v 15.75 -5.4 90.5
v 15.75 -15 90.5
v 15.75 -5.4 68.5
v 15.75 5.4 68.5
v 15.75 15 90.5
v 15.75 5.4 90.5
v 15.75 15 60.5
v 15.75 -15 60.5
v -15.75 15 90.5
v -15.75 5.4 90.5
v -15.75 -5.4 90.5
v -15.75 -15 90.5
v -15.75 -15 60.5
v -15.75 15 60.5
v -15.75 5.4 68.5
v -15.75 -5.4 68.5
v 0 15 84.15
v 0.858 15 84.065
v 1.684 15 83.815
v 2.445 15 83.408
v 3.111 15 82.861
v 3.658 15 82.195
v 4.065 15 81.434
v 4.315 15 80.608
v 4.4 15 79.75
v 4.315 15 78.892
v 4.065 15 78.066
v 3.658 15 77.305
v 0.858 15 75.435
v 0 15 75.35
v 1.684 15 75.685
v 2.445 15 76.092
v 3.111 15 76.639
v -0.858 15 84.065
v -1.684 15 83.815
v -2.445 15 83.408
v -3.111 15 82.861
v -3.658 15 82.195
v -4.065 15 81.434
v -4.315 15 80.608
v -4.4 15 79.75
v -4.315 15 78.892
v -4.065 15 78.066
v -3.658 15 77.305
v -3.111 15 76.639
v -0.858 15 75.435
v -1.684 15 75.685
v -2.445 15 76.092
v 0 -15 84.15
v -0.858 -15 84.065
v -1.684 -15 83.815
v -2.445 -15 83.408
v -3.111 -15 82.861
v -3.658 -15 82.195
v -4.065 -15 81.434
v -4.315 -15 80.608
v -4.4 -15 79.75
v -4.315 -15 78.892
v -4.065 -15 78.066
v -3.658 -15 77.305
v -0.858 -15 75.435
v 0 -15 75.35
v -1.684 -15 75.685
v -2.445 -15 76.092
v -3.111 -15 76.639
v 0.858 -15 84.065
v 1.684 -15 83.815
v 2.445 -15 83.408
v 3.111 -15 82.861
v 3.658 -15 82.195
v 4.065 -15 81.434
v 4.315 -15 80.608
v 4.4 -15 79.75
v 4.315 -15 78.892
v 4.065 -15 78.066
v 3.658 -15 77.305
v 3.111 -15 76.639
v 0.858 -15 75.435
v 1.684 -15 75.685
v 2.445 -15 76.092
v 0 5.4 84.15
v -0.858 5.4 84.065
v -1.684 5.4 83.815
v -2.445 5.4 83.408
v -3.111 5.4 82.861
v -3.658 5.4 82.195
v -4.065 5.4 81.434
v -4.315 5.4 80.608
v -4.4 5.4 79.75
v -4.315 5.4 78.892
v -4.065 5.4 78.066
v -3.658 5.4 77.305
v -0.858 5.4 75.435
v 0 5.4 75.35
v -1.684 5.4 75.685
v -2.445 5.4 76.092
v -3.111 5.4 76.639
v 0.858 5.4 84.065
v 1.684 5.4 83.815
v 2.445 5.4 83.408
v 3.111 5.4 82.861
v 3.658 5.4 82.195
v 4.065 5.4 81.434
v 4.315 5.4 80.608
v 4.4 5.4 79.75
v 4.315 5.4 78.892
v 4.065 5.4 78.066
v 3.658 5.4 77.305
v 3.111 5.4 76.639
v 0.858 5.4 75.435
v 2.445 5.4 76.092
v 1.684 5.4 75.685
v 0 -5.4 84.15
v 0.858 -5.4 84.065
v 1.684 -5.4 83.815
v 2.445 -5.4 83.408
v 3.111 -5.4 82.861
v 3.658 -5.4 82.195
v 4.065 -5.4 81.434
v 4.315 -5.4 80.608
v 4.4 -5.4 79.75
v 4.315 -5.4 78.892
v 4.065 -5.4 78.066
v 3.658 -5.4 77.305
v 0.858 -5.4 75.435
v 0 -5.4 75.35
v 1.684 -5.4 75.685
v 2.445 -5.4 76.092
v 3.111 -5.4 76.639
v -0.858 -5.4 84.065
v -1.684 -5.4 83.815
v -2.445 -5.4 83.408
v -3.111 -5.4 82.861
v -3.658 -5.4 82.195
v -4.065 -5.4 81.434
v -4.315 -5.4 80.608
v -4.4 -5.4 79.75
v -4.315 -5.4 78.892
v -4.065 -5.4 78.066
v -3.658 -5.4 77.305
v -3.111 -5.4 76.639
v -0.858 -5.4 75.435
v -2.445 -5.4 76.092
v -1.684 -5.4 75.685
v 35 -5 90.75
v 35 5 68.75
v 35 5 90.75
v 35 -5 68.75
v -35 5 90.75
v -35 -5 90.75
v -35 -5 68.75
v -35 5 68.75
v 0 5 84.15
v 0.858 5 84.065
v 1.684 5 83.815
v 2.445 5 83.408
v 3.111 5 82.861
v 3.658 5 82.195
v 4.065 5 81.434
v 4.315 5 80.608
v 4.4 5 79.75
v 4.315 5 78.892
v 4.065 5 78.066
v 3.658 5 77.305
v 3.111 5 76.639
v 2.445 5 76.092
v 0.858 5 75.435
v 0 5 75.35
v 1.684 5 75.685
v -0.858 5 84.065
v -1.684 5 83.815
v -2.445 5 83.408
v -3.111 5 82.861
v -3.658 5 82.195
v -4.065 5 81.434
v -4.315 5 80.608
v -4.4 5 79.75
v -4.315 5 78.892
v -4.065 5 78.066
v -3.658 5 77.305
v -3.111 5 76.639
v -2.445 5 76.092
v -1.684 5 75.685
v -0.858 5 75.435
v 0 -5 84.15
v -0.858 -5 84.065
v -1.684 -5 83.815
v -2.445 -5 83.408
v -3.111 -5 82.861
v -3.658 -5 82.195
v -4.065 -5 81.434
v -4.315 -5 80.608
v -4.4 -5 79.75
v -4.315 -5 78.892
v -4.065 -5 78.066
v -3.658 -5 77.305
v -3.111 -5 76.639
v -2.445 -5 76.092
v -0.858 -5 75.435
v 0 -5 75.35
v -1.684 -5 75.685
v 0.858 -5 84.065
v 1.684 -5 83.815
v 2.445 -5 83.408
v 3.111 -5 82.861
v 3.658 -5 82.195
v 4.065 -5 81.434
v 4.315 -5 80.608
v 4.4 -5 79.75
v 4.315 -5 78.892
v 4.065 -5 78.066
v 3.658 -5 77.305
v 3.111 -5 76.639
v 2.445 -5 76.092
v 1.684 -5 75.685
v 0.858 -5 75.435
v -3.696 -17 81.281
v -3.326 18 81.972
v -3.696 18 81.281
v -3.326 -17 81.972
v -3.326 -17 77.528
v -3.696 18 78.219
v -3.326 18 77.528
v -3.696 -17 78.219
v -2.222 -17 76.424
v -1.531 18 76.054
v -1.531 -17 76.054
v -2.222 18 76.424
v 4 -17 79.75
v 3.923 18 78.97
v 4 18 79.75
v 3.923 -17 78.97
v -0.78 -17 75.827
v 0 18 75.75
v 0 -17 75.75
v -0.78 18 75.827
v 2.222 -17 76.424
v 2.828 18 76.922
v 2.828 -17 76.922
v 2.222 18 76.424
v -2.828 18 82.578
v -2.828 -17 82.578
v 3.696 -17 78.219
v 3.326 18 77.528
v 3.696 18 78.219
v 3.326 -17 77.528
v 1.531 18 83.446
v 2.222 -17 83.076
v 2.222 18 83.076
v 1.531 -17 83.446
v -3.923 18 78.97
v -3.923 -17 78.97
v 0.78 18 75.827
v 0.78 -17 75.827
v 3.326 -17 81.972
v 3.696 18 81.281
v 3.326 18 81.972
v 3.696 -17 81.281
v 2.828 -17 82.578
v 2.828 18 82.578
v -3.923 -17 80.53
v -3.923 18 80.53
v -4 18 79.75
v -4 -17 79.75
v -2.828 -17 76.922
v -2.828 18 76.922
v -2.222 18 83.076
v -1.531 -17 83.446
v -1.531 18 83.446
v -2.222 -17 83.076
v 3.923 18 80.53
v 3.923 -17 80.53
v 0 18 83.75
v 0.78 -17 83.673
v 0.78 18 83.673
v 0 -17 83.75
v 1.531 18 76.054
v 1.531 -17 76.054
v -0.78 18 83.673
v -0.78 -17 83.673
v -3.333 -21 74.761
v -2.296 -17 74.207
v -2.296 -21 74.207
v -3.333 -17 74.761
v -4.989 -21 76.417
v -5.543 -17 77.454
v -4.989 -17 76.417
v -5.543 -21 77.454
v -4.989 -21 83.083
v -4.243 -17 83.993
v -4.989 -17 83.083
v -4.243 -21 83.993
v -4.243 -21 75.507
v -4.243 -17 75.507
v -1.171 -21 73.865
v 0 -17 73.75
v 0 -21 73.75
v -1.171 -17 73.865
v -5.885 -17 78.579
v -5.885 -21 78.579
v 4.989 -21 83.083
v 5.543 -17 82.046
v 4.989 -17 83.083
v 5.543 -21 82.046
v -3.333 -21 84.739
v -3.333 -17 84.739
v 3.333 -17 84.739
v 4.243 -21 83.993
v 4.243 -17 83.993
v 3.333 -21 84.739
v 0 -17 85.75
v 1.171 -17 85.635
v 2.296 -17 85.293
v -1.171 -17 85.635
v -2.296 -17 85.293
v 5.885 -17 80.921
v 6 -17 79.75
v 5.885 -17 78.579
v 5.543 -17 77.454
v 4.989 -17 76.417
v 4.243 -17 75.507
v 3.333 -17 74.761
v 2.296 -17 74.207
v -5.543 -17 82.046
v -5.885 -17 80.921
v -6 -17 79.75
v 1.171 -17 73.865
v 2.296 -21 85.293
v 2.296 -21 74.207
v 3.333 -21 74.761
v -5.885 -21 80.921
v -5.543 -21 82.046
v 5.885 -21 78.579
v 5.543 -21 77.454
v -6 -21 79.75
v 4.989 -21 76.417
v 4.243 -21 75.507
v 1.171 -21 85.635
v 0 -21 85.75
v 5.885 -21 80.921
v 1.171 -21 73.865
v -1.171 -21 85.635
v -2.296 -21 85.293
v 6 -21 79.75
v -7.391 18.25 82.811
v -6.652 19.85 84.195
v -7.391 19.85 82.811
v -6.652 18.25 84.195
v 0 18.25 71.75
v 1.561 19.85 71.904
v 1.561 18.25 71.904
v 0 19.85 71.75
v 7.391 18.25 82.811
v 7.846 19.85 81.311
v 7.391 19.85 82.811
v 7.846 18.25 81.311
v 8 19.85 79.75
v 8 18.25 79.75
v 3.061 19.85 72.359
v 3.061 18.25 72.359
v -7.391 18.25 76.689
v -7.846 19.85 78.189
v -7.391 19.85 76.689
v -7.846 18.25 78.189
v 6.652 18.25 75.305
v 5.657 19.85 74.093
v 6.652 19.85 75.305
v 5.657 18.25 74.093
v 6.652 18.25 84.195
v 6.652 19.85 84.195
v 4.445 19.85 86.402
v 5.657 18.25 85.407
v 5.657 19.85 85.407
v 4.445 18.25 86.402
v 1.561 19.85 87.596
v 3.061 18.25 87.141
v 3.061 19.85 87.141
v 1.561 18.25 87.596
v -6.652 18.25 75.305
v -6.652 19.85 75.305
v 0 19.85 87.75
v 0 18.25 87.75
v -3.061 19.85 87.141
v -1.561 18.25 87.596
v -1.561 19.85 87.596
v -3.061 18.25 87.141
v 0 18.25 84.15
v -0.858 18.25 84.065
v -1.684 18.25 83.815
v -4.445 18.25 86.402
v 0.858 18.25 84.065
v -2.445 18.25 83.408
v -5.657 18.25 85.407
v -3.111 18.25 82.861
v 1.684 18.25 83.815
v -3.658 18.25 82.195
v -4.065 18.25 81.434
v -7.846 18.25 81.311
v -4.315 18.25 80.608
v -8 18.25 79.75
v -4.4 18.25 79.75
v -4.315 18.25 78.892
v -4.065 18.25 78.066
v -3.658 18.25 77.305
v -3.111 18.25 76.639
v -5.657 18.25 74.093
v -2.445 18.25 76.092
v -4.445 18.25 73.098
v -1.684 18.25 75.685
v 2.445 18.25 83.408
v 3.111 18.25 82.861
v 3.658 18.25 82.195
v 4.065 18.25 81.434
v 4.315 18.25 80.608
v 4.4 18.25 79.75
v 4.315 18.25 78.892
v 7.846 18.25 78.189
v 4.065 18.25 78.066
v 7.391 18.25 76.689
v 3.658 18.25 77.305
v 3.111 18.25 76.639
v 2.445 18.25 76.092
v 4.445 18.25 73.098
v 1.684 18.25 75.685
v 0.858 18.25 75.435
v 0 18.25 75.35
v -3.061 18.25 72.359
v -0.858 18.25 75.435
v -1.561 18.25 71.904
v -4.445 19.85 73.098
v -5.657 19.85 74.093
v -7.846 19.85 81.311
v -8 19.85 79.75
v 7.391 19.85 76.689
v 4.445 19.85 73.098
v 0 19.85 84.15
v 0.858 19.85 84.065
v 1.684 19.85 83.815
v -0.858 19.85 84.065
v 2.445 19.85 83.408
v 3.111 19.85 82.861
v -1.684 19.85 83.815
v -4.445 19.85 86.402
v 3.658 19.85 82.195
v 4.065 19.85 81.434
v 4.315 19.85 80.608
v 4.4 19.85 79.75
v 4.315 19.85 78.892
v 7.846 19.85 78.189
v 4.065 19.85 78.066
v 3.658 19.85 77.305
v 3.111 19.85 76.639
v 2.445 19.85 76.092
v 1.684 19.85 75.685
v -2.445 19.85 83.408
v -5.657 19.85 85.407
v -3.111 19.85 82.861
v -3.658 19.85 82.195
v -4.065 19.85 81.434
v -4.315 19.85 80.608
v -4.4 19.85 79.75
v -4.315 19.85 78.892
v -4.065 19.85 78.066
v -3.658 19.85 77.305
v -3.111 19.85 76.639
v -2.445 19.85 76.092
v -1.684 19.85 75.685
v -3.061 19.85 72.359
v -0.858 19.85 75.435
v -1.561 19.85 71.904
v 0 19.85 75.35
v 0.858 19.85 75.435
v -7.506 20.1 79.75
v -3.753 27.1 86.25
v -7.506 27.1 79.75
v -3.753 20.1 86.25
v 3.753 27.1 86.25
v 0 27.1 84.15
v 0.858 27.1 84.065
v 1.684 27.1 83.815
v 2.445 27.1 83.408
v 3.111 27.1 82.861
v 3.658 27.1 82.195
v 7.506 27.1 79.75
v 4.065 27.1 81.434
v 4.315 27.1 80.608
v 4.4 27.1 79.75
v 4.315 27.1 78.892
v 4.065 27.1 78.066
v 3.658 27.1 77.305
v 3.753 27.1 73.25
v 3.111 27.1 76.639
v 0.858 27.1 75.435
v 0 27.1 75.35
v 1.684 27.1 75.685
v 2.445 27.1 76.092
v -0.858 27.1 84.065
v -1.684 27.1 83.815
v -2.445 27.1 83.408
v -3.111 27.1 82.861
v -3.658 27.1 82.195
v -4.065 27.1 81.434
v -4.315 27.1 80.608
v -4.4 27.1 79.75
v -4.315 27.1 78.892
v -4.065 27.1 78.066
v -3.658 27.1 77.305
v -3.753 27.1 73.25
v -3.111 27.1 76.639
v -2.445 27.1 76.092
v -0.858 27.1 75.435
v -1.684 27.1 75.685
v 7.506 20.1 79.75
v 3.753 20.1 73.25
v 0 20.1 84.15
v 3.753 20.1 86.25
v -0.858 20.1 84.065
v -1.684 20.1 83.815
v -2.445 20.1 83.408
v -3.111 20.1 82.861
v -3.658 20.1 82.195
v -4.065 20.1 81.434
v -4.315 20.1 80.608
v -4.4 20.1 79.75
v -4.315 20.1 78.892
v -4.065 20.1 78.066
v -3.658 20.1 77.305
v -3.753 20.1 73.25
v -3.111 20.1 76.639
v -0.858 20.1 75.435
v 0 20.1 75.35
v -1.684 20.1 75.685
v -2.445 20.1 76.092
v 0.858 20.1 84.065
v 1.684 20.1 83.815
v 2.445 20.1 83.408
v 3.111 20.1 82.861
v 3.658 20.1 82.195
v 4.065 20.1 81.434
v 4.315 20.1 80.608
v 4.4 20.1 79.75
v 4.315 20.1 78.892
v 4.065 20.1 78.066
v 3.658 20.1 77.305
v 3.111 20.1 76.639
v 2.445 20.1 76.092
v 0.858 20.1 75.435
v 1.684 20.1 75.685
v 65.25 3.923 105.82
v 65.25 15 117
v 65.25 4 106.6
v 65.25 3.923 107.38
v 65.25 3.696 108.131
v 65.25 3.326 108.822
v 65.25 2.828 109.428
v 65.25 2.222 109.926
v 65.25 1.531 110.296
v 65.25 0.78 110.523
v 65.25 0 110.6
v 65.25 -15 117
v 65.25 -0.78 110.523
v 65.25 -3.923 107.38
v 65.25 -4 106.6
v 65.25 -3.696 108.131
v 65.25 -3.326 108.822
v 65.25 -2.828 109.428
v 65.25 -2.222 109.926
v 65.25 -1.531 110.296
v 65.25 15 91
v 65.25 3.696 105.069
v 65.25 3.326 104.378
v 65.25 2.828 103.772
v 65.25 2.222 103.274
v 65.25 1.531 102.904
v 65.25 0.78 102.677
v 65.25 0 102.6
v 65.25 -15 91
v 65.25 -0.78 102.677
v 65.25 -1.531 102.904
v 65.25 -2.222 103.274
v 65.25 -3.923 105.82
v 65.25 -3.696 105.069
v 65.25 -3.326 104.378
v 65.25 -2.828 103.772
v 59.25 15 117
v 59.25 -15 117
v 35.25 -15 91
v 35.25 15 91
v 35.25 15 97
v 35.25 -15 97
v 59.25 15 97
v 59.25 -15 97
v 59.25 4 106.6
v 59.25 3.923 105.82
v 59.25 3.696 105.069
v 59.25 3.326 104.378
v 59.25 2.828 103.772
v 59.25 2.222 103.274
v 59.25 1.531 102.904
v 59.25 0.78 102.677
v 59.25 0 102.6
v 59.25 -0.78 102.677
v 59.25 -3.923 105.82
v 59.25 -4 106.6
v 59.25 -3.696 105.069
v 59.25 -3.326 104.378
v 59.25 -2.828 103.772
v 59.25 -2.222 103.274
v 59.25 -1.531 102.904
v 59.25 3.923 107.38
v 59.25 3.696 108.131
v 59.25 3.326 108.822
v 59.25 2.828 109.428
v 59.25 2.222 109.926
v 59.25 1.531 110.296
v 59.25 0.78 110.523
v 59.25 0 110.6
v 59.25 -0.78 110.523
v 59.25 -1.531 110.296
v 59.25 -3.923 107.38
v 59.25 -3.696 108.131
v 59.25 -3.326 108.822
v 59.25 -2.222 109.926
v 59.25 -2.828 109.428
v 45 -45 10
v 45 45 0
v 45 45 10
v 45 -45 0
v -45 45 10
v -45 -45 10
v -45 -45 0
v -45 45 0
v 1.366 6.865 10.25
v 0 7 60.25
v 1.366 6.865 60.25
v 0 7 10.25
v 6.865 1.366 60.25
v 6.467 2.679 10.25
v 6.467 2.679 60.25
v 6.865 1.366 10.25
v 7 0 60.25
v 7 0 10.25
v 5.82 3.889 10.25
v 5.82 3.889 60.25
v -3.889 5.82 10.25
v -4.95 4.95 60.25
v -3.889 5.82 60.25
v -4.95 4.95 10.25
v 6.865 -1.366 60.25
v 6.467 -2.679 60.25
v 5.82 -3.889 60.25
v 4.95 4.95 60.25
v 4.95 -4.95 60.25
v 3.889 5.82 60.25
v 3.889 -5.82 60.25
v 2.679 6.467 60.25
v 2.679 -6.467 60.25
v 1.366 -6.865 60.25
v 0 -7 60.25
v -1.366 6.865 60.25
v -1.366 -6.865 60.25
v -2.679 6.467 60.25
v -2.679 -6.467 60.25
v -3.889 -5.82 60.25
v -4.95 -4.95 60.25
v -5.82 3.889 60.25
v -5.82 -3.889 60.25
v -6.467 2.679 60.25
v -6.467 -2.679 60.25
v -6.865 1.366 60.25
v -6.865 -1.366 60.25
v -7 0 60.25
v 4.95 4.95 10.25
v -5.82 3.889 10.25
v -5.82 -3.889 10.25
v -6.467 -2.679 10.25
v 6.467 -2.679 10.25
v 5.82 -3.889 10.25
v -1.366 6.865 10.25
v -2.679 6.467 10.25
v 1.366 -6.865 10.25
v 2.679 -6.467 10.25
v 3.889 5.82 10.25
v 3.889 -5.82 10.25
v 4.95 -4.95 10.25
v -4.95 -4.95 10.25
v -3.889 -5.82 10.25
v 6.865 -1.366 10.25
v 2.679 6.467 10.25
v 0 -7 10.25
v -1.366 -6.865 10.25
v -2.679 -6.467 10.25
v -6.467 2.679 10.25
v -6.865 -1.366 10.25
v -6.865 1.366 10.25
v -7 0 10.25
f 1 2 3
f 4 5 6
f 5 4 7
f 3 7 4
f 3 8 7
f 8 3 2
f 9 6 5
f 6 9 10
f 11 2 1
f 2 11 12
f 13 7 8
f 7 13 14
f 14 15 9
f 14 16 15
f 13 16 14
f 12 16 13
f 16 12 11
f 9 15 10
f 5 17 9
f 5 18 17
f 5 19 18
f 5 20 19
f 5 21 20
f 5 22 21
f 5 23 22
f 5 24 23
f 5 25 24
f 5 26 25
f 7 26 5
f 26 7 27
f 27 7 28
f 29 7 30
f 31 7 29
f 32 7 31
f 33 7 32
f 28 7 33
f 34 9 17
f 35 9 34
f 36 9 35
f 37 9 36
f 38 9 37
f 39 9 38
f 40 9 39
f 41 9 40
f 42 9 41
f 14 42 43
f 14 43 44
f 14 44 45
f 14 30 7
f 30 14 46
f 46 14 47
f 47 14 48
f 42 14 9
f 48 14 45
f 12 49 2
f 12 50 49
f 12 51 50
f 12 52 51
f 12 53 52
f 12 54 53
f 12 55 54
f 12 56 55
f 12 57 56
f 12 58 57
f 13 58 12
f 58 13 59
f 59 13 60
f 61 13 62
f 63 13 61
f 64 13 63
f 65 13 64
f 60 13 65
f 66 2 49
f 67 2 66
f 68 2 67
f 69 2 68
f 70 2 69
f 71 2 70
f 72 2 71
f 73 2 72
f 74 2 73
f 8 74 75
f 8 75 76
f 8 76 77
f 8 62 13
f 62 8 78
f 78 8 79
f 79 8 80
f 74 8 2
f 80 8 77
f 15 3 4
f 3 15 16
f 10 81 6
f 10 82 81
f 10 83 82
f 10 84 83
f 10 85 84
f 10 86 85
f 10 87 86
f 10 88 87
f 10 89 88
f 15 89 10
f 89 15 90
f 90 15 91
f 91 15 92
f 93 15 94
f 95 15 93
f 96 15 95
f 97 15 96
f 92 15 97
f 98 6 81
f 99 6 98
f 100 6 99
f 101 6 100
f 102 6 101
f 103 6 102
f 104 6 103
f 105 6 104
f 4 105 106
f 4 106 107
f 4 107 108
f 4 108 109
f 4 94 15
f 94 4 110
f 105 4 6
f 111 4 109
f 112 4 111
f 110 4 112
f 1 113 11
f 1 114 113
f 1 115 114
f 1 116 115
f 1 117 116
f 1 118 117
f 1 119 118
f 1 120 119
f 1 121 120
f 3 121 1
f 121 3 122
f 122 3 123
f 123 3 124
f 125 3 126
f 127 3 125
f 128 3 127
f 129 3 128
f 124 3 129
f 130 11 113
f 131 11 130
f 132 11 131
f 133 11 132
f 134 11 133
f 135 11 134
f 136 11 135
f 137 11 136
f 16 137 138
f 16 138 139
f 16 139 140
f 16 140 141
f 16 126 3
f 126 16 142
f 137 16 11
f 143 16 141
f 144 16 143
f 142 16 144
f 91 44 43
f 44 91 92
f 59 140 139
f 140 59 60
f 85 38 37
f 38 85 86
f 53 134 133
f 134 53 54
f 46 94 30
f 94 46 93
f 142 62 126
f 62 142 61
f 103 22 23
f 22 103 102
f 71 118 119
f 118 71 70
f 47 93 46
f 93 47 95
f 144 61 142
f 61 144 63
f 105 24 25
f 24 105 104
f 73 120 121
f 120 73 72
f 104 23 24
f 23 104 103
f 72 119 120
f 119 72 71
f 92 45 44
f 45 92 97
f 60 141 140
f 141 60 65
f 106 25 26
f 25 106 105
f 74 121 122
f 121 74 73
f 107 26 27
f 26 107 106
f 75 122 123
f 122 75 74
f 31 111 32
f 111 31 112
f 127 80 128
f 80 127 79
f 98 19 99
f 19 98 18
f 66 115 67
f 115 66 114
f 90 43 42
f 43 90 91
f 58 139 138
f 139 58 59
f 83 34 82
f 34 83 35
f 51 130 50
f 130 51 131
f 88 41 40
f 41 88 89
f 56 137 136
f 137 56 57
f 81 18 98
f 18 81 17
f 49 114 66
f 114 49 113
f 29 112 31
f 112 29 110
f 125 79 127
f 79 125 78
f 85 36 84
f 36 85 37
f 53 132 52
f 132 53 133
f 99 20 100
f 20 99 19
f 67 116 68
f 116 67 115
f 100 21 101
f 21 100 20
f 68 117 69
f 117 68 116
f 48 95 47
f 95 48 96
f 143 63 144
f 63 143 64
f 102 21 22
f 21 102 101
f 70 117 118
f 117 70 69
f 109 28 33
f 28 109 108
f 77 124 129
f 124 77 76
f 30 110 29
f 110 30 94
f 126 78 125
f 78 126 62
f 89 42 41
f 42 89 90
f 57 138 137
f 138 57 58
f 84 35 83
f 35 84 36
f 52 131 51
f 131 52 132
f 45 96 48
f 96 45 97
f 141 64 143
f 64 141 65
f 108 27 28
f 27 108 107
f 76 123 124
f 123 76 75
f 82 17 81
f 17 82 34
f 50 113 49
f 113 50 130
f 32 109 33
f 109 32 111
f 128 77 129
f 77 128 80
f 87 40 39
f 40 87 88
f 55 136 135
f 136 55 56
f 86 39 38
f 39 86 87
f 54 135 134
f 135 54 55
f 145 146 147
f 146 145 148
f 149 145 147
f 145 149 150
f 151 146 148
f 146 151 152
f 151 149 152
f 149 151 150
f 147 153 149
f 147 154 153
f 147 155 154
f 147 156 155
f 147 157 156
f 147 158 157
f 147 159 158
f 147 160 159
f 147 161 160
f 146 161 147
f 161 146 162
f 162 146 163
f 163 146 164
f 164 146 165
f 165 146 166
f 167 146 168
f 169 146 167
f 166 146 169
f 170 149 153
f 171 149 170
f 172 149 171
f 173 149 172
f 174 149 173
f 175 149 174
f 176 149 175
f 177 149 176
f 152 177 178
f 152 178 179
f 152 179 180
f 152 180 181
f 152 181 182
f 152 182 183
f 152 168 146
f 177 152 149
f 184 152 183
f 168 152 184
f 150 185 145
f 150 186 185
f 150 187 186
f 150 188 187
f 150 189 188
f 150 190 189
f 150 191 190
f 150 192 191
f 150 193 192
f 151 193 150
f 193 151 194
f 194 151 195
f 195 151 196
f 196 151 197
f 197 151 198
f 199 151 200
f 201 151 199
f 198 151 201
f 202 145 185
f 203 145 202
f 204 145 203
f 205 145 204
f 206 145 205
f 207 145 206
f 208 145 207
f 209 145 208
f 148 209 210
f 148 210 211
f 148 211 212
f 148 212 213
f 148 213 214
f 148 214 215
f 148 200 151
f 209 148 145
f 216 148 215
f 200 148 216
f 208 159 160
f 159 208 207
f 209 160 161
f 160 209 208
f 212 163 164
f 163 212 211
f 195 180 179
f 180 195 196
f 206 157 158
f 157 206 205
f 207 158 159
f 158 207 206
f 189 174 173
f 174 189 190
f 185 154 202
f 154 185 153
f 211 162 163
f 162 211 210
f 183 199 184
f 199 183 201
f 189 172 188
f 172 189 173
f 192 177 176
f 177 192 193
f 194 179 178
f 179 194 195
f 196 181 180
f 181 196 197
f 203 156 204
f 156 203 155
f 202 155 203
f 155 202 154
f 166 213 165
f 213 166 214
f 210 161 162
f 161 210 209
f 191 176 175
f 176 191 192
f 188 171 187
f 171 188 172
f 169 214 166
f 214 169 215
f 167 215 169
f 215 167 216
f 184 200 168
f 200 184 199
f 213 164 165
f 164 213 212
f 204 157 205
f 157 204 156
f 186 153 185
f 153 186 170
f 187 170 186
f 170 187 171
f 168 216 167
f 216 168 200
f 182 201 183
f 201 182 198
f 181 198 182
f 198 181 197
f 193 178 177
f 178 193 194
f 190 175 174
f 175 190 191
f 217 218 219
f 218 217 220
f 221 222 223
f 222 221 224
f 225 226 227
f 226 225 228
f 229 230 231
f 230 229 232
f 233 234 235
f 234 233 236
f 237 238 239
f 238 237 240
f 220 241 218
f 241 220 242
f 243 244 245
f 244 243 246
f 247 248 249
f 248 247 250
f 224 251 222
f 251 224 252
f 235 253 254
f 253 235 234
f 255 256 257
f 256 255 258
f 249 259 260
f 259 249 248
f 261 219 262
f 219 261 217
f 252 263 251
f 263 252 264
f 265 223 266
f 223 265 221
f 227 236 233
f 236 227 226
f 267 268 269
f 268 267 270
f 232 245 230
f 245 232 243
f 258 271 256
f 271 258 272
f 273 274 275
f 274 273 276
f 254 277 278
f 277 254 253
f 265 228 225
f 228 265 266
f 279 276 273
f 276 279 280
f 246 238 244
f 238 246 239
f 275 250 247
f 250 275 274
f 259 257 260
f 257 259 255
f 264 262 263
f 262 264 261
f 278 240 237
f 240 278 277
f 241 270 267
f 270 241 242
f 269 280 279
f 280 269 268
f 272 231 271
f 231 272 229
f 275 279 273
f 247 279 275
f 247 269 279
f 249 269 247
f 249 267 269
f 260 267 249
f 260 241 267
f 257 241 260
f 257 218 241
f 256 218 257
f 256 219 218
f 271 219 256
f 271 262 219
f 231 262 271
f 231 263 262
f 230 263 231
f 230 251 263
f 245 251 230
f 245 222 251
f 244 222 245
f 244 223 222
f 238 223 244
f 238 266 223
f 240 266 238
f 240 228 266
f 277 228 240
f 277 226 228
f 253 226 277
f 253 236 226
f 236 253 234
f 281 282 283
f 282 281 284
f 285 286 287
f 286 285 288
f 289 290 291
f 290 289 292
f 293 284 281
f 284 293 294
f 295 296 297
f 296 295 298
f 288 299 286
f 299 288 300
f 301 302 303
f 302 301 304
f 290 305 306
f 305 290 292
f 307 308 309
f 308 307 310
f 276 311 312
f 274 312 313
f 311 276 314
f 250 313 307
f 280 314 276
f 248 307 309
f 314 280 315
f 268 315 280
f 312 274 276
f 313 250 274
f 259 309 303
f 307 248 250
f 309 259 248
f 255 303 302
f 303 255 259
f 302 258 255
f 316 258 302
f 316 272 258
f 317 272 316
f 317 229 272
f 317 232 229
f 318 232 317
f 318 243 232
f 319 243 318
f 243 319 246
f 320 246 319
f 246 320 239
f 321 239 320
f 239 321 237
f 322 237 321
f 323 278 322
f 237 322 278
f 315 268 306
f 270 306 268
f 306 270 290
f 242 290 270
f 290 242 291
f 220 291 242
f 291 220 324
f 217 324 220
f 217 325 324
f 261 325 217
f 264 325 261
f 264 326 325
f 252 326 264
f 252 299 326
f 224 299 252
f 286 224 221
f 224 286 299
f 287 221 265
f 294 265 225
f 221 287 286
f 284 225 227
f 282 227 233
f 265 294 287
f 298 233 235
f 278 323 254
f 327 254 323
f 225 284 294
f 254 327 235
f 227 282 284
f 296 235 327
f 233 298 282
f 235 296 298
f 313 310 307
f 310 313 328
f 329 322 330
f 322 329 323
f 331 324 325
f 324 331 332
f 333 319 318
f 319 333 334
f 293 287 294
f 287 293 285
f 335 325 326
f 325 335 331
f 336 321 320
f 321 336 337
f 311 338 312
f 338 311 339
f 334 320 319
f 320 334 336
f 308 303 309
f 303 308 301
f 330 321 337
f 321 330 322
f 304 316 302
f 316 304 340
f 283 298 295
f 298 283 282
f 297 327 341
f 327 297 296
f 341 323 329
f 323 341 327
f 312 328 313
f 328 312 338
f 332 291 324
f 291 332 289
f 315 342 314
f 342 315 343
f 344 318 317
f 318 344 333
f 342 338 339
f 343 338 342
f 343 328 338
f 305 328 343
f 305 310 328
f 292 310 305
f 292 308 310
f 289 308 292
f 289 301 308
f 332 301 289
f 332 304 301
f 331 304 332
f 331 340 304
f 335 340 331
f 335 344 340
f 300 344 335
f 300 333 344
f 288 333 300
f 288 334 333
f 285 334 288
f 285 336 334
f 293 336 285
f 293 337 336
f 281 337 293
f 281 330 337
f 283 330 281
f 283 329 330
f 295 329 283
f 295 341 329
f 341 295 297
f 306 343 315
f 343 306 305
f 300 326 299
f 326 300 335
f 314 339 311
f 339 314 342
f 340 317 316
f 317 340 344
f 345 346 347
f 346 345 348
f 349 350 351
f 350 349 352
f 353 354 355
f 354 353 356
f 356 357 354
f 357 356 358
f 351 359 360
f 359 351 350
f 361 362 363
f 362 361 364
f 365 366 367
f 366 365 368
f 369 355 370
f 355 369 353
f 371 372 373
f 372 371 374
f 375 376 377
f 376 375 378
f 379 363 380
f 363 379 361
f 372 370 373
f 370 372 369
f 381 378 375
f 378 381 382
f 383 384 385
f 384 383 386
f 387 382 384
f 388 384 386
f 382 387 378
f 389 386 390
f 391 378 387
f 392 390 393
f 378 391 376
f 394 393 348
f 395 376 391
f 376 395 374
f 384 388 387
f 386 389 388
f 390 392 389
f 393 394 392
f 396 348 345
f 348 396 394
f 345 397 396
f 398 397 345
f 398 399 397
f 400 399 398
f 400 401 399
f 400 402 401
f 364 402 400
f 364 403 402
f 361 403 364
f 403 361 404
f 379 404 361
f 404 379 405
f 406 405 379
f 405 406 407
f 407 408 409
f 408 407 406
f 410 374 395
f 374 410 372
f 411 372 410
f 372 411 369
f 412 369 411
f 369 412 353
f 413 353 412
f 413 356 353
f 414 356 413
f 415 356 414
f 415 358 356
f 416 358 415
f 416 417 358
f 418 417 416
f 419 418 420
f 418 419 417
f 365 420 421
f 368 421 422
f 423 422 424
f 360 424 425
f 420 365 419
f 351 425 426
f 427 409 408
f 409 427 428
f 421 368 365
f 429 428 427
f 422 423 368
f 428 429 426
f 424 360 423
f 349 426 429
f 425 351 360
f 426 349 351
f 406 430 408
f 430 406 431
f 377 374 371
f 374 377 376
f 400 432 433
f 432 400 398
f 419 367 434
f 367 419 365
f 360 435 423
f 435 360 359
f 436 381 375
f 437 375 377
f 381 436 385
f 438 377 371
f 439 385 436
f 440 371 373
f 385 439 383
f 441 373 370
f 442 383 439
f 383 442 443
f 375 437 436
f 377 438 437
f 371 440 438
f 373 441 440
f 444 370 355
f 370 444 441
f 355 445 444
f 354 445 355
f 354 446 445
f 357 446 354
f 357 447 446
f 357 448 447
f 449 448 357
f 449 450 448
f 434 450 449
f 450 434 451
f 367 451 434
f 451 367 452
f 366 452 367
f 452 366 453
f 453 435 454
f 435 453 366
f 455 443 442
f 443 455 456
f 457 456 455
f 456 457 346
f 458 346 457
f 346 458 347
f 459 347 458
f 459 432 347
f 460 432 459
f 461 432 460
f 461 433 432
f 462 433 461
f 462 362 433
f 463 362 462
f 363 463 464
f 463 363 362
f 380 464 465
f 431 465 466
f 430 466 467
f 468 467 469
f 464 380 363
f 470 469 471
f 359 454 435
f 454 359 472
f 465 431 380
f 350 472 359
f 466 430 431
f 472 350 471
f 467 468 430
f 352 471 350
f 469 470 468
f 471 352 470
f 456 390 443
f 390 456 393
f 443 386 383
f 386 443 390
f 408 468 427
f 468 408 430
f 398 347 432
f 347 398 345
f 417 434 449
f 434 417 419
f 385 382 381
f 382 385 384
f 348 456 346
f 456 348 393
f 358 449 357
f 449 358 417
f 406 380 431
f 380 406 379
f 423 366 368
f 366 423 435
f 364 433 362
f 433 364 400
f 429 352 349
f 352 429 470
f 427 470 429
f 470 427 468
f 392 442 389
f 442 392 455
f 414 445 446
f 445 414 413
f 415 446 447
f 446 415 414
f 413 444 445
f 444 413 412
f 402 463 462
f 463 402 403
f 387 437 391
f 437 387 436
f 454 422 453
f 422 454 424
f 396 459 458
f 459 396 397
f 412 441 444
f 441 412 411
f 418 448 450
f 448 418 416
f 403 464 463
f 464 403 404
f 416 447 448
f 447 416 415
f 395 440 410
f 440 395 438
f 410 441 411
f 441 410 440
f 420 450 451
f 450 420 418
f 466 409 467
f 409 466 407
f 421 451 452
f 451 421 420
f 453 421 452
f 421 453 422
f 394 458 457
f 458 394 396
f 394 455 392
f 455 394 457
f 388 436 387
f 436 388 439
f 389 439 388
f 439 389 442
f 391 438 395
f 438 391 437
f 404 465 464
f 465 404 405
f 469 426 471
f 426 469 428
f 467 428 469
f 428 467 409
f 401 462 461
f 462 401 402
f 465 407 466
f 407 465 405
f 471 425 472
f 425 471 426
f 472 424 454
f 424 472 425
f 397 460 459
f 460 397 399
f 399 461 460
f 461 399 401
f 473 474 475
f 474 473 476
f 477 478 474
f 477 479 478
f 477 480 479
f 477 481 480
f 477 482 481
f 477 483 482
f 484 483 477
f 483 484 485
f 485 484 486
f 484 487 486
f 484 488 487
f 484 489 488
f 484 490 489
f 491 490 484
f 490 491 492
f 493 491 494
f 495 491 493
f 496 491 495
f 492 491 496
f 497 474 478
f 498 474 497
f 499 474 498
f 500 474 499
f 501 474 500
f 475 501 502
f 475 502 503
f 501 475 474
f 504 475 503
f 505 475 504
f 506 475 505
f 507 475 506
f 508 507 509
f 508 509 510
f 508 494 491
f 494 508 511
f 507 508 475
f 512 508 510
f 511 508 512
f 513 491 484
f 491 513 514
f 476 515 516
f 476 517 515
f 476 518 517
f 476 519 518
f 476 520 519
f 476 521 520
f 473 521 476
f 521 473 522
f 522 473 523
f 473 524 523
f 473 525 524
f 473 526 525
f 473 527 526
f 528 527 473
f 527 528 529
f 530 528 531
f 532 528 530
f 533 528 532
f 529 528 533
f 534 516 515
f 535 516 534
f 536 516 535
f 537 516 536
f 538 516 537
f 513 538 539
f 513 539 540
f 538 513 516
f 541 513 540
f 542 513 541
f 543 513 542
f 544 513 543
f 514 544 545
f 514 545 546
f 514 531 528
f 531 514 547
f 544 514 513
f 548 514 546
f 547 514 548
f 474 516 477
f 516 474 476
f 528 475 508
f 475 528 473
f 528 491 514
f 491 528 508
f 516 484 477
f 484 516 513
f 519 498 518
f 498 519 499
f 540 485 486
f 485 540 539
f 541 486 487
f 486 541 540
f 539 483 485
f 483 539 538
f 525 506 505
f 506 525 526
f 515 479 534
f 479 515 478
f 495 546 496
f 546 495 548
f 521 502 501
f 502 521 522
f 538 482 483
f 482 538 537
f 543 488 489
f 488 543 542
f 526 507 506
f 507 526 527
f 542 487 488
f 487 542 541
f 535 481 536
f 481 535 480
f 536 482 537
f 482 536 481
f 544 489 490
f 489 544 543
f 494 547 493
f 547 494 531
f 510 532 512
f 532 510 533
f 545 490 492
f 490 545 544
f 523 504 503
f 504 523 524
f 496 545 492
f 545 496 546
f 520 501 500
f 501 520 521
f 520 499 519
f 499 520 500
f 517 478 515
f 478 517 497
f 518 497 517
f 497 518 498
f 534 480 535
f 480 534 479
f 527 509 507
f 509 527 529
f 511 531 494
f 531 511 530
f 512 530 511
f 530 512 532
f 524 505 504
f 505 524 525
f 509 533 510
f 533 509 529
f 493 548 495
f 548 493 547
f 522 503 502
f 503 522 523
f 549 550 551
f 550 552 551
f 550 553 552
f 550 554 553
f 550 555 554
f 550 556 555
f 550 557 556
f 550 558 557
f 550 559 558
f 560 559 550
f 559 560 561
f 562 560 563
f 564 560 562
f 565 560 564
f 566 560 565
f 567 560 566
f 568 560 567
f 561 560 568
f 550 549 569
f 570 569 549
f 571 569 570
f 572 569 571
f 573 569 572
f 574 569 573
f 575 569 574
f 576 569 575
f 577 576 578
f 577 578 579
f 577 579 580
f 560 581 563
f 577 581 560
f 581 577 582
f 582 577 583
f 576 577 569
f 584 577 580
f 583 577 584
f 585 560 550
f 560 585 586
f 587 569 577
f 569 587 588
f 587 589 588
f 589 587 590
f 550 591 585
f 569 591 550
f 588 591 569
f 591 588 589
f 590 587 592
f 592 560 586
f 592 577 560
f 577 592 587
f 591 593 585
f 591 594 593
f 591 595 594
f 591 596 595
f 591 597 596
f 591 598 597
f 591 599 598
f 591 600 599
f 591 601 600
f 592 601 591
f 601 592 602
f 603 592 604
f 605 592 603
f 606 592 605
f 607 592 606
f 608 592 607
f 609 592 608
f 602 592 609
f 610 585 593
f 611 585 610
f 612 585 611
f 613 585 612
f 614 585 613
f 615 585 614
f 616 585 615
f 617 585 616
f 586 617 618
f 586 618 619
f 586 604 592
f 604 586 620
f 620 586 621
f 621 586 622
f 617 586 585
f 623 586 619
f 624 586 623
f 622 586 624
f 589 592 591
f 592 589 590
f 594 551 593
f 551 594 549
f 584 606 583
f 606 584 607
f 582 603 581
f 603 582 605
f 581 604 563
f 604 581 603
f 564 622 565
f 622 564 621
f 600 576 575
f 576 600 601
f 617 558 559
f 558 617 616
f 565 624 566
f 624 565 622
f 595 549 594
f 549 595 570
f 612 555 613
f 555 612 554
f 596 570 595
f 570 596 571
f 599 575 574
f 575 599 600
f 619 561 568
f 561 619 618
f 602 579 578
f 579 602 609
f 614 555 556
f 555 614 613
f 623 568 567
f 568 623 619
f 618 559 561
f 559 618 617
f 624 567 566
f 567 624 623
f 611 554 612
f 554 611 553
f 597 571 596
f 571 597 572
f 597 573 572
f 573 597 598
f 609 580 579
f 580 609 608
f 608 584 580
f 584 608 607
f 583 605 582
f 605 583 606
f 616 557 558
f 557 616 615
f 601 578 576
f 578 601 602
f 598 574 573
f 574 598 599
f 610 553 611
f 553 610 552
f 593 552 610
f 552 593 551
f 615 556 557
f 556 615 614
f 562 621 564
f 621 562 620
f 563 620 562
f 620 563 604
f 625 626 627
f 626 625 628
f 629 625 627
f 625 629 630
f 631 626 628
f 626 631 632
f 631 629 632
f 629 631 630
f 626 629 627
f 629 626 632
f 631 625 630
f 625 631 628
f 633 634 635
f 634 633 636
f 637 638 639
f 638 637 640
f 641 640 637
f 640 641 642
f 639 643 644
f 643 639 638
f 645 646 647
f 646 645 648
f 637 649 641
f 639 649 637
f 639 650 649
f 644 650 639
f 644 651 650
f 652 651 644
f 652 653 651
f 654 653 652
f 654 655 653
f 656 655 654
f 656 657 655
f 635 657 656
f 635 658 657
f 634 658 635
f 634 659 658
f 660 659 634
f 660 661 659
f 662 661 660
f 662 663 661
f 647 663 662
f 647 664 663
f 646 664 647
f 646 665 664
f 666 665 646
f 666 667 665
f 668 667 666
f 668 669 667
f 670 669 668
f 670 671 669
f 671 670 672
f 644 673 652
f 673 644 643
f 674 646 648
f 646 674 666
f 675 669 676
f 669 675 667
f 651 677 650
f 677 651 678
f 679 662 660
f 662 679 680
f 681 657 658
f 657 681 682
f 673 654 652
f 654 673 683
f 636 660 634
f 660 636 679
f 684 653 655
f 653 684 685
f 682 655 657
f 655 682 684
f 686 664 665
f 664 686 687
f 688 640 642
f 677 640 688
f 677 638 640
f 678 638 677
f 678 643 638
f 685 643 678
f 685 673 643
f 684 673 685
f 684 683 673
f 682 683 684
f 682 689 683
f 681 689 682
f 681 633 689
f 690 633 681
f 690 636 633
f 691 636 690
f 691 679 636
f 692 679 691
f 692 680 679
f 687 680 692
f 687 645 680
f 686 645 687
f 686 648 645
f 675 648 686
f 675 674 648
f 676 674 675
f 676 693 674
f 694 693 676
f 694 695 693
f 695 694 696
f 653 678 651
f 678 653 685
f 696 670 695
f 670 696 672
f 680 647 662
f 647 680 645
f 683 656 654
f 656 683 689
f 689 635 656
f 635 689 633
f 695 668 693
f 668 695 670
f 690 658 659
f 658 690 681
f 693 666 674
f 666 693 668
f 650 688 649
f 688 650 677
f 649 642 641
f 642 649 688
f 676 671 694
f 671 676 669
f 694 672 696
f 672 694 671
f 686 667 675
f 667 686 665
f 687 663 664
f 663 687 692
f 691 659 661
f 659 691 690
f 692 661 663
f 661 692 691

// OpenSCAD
$fn = 32;

// ------------------------------------------------------------------------
// Lamp arm: column d14 x 50 mm, arm 70 mm
// Every part is its own module, assembly() places every instance.
// ------------------------------------------------------------------------

// --- part 1 ---
module lamp_base() {
  difference() {
    translate([-45, -45, 0]) cube([90, 90, 10]);
  }
}

// --- part 2 ---
module lamp_column() {
  cylinder(h = 50, d = 14);
}

// --- part 3 ---
module head_fork() {
  difference() {
    translate([-15.75, -15, 0]) cube([31.5, 30, 30]);
    translate([-16.75, -5.4, 8]) cube([33.5, 10.8, 23]);
    translate([0, 0, 19.25]) rotate([90, 0, 0]) cylinder(h = 32, d = 8.8, center = true);
  }
}

// --- part 4 ---
module lamp_arm() {
  difference() {
    translate([-35, -5, 0]) cube([70, 10, 22]);
    translate([0, 0, 11]) rotate([90, 0, 0]) cylinder(h = 12, d = 8.8, center = true);
  }
}

// --- part 5 ---
module arm_pin() {
  rotate([0, 90, 0]) cylinder(h = 36, d = 8, center = true);
  translate([-21, 0, 0]) rotate([0, 90, 0]) cylinder(h = 4, d = 12);
}

// --- part 6 ---
module arm_washer() {
  difference() {
      translate([0, 0, 0]) cylinder(h = 1.6, d = 16);
      translate([0, 0, -1]) cylinder(h = 3.6, d = 8.8);
    }
}

// --- part 7 ---
module arm_nut() {
  difference() {
    linear_extrude(height = 7) polygon(points = [[7.506, 0], [3.753, 6.5], [-3.753, 6.5], [-7.506, 0], [-3.753, -6.5], [3.753, -6.5]]);
    translate([0, 0, -1]) cylinder(h = 9, d = 8.8);
  }
}

// --- part 8 ---
module shade_bracket() {
  difference() {
    translate([-15, -15, 0]) cube([30, 30, 26]);
    translate([-16, -16, 6]) cube([25, 32, 21]);
    translate([12, 0, 15.6]) rotate([0, 90, 0]) cylinder(h = 8, d = 8, center = true);
  }
}

// --- assembly ---
module assembly() {
  color([0.80, 0.24, 0.20]) translate([0, 0, 0]) rotate([0, 0, 0]) lamp_base();
  color([0.20, 0.45, 0.75]) translate([0, 0, 10.25]) rotate([0, 0, 0]) lamp_column();
  color([0.25, 0.62, 0.32]) translate([0, 0, 60.5]) rotate([0, 0, 0]) head_fork();
  color([0.92, 0.70, 0.18]) translate([0, 0, 68.75]) rotate([0, 0, 0]) lamp_arm();
  color([0.58, 0.35, 0.70]) translate([0, 0, 79.75]) rotate([0, 0, 90]) arm_pin();
  color([0.16, 0.66, 0.66]) translate([0, 19.85, 79.75]) rotate([90, 0, 0]) arm_washer();
  color([0.85, 0.48, 0.18]) translate([0, 27.1, 79.75]) rotate([90, 0, 0]) arm_nut();
  color([0.55, 0.60, 0.65]) translate([50.25, 0, 91]) rotate([0, 0, 0]) shade_bracket();
}

assembly();
